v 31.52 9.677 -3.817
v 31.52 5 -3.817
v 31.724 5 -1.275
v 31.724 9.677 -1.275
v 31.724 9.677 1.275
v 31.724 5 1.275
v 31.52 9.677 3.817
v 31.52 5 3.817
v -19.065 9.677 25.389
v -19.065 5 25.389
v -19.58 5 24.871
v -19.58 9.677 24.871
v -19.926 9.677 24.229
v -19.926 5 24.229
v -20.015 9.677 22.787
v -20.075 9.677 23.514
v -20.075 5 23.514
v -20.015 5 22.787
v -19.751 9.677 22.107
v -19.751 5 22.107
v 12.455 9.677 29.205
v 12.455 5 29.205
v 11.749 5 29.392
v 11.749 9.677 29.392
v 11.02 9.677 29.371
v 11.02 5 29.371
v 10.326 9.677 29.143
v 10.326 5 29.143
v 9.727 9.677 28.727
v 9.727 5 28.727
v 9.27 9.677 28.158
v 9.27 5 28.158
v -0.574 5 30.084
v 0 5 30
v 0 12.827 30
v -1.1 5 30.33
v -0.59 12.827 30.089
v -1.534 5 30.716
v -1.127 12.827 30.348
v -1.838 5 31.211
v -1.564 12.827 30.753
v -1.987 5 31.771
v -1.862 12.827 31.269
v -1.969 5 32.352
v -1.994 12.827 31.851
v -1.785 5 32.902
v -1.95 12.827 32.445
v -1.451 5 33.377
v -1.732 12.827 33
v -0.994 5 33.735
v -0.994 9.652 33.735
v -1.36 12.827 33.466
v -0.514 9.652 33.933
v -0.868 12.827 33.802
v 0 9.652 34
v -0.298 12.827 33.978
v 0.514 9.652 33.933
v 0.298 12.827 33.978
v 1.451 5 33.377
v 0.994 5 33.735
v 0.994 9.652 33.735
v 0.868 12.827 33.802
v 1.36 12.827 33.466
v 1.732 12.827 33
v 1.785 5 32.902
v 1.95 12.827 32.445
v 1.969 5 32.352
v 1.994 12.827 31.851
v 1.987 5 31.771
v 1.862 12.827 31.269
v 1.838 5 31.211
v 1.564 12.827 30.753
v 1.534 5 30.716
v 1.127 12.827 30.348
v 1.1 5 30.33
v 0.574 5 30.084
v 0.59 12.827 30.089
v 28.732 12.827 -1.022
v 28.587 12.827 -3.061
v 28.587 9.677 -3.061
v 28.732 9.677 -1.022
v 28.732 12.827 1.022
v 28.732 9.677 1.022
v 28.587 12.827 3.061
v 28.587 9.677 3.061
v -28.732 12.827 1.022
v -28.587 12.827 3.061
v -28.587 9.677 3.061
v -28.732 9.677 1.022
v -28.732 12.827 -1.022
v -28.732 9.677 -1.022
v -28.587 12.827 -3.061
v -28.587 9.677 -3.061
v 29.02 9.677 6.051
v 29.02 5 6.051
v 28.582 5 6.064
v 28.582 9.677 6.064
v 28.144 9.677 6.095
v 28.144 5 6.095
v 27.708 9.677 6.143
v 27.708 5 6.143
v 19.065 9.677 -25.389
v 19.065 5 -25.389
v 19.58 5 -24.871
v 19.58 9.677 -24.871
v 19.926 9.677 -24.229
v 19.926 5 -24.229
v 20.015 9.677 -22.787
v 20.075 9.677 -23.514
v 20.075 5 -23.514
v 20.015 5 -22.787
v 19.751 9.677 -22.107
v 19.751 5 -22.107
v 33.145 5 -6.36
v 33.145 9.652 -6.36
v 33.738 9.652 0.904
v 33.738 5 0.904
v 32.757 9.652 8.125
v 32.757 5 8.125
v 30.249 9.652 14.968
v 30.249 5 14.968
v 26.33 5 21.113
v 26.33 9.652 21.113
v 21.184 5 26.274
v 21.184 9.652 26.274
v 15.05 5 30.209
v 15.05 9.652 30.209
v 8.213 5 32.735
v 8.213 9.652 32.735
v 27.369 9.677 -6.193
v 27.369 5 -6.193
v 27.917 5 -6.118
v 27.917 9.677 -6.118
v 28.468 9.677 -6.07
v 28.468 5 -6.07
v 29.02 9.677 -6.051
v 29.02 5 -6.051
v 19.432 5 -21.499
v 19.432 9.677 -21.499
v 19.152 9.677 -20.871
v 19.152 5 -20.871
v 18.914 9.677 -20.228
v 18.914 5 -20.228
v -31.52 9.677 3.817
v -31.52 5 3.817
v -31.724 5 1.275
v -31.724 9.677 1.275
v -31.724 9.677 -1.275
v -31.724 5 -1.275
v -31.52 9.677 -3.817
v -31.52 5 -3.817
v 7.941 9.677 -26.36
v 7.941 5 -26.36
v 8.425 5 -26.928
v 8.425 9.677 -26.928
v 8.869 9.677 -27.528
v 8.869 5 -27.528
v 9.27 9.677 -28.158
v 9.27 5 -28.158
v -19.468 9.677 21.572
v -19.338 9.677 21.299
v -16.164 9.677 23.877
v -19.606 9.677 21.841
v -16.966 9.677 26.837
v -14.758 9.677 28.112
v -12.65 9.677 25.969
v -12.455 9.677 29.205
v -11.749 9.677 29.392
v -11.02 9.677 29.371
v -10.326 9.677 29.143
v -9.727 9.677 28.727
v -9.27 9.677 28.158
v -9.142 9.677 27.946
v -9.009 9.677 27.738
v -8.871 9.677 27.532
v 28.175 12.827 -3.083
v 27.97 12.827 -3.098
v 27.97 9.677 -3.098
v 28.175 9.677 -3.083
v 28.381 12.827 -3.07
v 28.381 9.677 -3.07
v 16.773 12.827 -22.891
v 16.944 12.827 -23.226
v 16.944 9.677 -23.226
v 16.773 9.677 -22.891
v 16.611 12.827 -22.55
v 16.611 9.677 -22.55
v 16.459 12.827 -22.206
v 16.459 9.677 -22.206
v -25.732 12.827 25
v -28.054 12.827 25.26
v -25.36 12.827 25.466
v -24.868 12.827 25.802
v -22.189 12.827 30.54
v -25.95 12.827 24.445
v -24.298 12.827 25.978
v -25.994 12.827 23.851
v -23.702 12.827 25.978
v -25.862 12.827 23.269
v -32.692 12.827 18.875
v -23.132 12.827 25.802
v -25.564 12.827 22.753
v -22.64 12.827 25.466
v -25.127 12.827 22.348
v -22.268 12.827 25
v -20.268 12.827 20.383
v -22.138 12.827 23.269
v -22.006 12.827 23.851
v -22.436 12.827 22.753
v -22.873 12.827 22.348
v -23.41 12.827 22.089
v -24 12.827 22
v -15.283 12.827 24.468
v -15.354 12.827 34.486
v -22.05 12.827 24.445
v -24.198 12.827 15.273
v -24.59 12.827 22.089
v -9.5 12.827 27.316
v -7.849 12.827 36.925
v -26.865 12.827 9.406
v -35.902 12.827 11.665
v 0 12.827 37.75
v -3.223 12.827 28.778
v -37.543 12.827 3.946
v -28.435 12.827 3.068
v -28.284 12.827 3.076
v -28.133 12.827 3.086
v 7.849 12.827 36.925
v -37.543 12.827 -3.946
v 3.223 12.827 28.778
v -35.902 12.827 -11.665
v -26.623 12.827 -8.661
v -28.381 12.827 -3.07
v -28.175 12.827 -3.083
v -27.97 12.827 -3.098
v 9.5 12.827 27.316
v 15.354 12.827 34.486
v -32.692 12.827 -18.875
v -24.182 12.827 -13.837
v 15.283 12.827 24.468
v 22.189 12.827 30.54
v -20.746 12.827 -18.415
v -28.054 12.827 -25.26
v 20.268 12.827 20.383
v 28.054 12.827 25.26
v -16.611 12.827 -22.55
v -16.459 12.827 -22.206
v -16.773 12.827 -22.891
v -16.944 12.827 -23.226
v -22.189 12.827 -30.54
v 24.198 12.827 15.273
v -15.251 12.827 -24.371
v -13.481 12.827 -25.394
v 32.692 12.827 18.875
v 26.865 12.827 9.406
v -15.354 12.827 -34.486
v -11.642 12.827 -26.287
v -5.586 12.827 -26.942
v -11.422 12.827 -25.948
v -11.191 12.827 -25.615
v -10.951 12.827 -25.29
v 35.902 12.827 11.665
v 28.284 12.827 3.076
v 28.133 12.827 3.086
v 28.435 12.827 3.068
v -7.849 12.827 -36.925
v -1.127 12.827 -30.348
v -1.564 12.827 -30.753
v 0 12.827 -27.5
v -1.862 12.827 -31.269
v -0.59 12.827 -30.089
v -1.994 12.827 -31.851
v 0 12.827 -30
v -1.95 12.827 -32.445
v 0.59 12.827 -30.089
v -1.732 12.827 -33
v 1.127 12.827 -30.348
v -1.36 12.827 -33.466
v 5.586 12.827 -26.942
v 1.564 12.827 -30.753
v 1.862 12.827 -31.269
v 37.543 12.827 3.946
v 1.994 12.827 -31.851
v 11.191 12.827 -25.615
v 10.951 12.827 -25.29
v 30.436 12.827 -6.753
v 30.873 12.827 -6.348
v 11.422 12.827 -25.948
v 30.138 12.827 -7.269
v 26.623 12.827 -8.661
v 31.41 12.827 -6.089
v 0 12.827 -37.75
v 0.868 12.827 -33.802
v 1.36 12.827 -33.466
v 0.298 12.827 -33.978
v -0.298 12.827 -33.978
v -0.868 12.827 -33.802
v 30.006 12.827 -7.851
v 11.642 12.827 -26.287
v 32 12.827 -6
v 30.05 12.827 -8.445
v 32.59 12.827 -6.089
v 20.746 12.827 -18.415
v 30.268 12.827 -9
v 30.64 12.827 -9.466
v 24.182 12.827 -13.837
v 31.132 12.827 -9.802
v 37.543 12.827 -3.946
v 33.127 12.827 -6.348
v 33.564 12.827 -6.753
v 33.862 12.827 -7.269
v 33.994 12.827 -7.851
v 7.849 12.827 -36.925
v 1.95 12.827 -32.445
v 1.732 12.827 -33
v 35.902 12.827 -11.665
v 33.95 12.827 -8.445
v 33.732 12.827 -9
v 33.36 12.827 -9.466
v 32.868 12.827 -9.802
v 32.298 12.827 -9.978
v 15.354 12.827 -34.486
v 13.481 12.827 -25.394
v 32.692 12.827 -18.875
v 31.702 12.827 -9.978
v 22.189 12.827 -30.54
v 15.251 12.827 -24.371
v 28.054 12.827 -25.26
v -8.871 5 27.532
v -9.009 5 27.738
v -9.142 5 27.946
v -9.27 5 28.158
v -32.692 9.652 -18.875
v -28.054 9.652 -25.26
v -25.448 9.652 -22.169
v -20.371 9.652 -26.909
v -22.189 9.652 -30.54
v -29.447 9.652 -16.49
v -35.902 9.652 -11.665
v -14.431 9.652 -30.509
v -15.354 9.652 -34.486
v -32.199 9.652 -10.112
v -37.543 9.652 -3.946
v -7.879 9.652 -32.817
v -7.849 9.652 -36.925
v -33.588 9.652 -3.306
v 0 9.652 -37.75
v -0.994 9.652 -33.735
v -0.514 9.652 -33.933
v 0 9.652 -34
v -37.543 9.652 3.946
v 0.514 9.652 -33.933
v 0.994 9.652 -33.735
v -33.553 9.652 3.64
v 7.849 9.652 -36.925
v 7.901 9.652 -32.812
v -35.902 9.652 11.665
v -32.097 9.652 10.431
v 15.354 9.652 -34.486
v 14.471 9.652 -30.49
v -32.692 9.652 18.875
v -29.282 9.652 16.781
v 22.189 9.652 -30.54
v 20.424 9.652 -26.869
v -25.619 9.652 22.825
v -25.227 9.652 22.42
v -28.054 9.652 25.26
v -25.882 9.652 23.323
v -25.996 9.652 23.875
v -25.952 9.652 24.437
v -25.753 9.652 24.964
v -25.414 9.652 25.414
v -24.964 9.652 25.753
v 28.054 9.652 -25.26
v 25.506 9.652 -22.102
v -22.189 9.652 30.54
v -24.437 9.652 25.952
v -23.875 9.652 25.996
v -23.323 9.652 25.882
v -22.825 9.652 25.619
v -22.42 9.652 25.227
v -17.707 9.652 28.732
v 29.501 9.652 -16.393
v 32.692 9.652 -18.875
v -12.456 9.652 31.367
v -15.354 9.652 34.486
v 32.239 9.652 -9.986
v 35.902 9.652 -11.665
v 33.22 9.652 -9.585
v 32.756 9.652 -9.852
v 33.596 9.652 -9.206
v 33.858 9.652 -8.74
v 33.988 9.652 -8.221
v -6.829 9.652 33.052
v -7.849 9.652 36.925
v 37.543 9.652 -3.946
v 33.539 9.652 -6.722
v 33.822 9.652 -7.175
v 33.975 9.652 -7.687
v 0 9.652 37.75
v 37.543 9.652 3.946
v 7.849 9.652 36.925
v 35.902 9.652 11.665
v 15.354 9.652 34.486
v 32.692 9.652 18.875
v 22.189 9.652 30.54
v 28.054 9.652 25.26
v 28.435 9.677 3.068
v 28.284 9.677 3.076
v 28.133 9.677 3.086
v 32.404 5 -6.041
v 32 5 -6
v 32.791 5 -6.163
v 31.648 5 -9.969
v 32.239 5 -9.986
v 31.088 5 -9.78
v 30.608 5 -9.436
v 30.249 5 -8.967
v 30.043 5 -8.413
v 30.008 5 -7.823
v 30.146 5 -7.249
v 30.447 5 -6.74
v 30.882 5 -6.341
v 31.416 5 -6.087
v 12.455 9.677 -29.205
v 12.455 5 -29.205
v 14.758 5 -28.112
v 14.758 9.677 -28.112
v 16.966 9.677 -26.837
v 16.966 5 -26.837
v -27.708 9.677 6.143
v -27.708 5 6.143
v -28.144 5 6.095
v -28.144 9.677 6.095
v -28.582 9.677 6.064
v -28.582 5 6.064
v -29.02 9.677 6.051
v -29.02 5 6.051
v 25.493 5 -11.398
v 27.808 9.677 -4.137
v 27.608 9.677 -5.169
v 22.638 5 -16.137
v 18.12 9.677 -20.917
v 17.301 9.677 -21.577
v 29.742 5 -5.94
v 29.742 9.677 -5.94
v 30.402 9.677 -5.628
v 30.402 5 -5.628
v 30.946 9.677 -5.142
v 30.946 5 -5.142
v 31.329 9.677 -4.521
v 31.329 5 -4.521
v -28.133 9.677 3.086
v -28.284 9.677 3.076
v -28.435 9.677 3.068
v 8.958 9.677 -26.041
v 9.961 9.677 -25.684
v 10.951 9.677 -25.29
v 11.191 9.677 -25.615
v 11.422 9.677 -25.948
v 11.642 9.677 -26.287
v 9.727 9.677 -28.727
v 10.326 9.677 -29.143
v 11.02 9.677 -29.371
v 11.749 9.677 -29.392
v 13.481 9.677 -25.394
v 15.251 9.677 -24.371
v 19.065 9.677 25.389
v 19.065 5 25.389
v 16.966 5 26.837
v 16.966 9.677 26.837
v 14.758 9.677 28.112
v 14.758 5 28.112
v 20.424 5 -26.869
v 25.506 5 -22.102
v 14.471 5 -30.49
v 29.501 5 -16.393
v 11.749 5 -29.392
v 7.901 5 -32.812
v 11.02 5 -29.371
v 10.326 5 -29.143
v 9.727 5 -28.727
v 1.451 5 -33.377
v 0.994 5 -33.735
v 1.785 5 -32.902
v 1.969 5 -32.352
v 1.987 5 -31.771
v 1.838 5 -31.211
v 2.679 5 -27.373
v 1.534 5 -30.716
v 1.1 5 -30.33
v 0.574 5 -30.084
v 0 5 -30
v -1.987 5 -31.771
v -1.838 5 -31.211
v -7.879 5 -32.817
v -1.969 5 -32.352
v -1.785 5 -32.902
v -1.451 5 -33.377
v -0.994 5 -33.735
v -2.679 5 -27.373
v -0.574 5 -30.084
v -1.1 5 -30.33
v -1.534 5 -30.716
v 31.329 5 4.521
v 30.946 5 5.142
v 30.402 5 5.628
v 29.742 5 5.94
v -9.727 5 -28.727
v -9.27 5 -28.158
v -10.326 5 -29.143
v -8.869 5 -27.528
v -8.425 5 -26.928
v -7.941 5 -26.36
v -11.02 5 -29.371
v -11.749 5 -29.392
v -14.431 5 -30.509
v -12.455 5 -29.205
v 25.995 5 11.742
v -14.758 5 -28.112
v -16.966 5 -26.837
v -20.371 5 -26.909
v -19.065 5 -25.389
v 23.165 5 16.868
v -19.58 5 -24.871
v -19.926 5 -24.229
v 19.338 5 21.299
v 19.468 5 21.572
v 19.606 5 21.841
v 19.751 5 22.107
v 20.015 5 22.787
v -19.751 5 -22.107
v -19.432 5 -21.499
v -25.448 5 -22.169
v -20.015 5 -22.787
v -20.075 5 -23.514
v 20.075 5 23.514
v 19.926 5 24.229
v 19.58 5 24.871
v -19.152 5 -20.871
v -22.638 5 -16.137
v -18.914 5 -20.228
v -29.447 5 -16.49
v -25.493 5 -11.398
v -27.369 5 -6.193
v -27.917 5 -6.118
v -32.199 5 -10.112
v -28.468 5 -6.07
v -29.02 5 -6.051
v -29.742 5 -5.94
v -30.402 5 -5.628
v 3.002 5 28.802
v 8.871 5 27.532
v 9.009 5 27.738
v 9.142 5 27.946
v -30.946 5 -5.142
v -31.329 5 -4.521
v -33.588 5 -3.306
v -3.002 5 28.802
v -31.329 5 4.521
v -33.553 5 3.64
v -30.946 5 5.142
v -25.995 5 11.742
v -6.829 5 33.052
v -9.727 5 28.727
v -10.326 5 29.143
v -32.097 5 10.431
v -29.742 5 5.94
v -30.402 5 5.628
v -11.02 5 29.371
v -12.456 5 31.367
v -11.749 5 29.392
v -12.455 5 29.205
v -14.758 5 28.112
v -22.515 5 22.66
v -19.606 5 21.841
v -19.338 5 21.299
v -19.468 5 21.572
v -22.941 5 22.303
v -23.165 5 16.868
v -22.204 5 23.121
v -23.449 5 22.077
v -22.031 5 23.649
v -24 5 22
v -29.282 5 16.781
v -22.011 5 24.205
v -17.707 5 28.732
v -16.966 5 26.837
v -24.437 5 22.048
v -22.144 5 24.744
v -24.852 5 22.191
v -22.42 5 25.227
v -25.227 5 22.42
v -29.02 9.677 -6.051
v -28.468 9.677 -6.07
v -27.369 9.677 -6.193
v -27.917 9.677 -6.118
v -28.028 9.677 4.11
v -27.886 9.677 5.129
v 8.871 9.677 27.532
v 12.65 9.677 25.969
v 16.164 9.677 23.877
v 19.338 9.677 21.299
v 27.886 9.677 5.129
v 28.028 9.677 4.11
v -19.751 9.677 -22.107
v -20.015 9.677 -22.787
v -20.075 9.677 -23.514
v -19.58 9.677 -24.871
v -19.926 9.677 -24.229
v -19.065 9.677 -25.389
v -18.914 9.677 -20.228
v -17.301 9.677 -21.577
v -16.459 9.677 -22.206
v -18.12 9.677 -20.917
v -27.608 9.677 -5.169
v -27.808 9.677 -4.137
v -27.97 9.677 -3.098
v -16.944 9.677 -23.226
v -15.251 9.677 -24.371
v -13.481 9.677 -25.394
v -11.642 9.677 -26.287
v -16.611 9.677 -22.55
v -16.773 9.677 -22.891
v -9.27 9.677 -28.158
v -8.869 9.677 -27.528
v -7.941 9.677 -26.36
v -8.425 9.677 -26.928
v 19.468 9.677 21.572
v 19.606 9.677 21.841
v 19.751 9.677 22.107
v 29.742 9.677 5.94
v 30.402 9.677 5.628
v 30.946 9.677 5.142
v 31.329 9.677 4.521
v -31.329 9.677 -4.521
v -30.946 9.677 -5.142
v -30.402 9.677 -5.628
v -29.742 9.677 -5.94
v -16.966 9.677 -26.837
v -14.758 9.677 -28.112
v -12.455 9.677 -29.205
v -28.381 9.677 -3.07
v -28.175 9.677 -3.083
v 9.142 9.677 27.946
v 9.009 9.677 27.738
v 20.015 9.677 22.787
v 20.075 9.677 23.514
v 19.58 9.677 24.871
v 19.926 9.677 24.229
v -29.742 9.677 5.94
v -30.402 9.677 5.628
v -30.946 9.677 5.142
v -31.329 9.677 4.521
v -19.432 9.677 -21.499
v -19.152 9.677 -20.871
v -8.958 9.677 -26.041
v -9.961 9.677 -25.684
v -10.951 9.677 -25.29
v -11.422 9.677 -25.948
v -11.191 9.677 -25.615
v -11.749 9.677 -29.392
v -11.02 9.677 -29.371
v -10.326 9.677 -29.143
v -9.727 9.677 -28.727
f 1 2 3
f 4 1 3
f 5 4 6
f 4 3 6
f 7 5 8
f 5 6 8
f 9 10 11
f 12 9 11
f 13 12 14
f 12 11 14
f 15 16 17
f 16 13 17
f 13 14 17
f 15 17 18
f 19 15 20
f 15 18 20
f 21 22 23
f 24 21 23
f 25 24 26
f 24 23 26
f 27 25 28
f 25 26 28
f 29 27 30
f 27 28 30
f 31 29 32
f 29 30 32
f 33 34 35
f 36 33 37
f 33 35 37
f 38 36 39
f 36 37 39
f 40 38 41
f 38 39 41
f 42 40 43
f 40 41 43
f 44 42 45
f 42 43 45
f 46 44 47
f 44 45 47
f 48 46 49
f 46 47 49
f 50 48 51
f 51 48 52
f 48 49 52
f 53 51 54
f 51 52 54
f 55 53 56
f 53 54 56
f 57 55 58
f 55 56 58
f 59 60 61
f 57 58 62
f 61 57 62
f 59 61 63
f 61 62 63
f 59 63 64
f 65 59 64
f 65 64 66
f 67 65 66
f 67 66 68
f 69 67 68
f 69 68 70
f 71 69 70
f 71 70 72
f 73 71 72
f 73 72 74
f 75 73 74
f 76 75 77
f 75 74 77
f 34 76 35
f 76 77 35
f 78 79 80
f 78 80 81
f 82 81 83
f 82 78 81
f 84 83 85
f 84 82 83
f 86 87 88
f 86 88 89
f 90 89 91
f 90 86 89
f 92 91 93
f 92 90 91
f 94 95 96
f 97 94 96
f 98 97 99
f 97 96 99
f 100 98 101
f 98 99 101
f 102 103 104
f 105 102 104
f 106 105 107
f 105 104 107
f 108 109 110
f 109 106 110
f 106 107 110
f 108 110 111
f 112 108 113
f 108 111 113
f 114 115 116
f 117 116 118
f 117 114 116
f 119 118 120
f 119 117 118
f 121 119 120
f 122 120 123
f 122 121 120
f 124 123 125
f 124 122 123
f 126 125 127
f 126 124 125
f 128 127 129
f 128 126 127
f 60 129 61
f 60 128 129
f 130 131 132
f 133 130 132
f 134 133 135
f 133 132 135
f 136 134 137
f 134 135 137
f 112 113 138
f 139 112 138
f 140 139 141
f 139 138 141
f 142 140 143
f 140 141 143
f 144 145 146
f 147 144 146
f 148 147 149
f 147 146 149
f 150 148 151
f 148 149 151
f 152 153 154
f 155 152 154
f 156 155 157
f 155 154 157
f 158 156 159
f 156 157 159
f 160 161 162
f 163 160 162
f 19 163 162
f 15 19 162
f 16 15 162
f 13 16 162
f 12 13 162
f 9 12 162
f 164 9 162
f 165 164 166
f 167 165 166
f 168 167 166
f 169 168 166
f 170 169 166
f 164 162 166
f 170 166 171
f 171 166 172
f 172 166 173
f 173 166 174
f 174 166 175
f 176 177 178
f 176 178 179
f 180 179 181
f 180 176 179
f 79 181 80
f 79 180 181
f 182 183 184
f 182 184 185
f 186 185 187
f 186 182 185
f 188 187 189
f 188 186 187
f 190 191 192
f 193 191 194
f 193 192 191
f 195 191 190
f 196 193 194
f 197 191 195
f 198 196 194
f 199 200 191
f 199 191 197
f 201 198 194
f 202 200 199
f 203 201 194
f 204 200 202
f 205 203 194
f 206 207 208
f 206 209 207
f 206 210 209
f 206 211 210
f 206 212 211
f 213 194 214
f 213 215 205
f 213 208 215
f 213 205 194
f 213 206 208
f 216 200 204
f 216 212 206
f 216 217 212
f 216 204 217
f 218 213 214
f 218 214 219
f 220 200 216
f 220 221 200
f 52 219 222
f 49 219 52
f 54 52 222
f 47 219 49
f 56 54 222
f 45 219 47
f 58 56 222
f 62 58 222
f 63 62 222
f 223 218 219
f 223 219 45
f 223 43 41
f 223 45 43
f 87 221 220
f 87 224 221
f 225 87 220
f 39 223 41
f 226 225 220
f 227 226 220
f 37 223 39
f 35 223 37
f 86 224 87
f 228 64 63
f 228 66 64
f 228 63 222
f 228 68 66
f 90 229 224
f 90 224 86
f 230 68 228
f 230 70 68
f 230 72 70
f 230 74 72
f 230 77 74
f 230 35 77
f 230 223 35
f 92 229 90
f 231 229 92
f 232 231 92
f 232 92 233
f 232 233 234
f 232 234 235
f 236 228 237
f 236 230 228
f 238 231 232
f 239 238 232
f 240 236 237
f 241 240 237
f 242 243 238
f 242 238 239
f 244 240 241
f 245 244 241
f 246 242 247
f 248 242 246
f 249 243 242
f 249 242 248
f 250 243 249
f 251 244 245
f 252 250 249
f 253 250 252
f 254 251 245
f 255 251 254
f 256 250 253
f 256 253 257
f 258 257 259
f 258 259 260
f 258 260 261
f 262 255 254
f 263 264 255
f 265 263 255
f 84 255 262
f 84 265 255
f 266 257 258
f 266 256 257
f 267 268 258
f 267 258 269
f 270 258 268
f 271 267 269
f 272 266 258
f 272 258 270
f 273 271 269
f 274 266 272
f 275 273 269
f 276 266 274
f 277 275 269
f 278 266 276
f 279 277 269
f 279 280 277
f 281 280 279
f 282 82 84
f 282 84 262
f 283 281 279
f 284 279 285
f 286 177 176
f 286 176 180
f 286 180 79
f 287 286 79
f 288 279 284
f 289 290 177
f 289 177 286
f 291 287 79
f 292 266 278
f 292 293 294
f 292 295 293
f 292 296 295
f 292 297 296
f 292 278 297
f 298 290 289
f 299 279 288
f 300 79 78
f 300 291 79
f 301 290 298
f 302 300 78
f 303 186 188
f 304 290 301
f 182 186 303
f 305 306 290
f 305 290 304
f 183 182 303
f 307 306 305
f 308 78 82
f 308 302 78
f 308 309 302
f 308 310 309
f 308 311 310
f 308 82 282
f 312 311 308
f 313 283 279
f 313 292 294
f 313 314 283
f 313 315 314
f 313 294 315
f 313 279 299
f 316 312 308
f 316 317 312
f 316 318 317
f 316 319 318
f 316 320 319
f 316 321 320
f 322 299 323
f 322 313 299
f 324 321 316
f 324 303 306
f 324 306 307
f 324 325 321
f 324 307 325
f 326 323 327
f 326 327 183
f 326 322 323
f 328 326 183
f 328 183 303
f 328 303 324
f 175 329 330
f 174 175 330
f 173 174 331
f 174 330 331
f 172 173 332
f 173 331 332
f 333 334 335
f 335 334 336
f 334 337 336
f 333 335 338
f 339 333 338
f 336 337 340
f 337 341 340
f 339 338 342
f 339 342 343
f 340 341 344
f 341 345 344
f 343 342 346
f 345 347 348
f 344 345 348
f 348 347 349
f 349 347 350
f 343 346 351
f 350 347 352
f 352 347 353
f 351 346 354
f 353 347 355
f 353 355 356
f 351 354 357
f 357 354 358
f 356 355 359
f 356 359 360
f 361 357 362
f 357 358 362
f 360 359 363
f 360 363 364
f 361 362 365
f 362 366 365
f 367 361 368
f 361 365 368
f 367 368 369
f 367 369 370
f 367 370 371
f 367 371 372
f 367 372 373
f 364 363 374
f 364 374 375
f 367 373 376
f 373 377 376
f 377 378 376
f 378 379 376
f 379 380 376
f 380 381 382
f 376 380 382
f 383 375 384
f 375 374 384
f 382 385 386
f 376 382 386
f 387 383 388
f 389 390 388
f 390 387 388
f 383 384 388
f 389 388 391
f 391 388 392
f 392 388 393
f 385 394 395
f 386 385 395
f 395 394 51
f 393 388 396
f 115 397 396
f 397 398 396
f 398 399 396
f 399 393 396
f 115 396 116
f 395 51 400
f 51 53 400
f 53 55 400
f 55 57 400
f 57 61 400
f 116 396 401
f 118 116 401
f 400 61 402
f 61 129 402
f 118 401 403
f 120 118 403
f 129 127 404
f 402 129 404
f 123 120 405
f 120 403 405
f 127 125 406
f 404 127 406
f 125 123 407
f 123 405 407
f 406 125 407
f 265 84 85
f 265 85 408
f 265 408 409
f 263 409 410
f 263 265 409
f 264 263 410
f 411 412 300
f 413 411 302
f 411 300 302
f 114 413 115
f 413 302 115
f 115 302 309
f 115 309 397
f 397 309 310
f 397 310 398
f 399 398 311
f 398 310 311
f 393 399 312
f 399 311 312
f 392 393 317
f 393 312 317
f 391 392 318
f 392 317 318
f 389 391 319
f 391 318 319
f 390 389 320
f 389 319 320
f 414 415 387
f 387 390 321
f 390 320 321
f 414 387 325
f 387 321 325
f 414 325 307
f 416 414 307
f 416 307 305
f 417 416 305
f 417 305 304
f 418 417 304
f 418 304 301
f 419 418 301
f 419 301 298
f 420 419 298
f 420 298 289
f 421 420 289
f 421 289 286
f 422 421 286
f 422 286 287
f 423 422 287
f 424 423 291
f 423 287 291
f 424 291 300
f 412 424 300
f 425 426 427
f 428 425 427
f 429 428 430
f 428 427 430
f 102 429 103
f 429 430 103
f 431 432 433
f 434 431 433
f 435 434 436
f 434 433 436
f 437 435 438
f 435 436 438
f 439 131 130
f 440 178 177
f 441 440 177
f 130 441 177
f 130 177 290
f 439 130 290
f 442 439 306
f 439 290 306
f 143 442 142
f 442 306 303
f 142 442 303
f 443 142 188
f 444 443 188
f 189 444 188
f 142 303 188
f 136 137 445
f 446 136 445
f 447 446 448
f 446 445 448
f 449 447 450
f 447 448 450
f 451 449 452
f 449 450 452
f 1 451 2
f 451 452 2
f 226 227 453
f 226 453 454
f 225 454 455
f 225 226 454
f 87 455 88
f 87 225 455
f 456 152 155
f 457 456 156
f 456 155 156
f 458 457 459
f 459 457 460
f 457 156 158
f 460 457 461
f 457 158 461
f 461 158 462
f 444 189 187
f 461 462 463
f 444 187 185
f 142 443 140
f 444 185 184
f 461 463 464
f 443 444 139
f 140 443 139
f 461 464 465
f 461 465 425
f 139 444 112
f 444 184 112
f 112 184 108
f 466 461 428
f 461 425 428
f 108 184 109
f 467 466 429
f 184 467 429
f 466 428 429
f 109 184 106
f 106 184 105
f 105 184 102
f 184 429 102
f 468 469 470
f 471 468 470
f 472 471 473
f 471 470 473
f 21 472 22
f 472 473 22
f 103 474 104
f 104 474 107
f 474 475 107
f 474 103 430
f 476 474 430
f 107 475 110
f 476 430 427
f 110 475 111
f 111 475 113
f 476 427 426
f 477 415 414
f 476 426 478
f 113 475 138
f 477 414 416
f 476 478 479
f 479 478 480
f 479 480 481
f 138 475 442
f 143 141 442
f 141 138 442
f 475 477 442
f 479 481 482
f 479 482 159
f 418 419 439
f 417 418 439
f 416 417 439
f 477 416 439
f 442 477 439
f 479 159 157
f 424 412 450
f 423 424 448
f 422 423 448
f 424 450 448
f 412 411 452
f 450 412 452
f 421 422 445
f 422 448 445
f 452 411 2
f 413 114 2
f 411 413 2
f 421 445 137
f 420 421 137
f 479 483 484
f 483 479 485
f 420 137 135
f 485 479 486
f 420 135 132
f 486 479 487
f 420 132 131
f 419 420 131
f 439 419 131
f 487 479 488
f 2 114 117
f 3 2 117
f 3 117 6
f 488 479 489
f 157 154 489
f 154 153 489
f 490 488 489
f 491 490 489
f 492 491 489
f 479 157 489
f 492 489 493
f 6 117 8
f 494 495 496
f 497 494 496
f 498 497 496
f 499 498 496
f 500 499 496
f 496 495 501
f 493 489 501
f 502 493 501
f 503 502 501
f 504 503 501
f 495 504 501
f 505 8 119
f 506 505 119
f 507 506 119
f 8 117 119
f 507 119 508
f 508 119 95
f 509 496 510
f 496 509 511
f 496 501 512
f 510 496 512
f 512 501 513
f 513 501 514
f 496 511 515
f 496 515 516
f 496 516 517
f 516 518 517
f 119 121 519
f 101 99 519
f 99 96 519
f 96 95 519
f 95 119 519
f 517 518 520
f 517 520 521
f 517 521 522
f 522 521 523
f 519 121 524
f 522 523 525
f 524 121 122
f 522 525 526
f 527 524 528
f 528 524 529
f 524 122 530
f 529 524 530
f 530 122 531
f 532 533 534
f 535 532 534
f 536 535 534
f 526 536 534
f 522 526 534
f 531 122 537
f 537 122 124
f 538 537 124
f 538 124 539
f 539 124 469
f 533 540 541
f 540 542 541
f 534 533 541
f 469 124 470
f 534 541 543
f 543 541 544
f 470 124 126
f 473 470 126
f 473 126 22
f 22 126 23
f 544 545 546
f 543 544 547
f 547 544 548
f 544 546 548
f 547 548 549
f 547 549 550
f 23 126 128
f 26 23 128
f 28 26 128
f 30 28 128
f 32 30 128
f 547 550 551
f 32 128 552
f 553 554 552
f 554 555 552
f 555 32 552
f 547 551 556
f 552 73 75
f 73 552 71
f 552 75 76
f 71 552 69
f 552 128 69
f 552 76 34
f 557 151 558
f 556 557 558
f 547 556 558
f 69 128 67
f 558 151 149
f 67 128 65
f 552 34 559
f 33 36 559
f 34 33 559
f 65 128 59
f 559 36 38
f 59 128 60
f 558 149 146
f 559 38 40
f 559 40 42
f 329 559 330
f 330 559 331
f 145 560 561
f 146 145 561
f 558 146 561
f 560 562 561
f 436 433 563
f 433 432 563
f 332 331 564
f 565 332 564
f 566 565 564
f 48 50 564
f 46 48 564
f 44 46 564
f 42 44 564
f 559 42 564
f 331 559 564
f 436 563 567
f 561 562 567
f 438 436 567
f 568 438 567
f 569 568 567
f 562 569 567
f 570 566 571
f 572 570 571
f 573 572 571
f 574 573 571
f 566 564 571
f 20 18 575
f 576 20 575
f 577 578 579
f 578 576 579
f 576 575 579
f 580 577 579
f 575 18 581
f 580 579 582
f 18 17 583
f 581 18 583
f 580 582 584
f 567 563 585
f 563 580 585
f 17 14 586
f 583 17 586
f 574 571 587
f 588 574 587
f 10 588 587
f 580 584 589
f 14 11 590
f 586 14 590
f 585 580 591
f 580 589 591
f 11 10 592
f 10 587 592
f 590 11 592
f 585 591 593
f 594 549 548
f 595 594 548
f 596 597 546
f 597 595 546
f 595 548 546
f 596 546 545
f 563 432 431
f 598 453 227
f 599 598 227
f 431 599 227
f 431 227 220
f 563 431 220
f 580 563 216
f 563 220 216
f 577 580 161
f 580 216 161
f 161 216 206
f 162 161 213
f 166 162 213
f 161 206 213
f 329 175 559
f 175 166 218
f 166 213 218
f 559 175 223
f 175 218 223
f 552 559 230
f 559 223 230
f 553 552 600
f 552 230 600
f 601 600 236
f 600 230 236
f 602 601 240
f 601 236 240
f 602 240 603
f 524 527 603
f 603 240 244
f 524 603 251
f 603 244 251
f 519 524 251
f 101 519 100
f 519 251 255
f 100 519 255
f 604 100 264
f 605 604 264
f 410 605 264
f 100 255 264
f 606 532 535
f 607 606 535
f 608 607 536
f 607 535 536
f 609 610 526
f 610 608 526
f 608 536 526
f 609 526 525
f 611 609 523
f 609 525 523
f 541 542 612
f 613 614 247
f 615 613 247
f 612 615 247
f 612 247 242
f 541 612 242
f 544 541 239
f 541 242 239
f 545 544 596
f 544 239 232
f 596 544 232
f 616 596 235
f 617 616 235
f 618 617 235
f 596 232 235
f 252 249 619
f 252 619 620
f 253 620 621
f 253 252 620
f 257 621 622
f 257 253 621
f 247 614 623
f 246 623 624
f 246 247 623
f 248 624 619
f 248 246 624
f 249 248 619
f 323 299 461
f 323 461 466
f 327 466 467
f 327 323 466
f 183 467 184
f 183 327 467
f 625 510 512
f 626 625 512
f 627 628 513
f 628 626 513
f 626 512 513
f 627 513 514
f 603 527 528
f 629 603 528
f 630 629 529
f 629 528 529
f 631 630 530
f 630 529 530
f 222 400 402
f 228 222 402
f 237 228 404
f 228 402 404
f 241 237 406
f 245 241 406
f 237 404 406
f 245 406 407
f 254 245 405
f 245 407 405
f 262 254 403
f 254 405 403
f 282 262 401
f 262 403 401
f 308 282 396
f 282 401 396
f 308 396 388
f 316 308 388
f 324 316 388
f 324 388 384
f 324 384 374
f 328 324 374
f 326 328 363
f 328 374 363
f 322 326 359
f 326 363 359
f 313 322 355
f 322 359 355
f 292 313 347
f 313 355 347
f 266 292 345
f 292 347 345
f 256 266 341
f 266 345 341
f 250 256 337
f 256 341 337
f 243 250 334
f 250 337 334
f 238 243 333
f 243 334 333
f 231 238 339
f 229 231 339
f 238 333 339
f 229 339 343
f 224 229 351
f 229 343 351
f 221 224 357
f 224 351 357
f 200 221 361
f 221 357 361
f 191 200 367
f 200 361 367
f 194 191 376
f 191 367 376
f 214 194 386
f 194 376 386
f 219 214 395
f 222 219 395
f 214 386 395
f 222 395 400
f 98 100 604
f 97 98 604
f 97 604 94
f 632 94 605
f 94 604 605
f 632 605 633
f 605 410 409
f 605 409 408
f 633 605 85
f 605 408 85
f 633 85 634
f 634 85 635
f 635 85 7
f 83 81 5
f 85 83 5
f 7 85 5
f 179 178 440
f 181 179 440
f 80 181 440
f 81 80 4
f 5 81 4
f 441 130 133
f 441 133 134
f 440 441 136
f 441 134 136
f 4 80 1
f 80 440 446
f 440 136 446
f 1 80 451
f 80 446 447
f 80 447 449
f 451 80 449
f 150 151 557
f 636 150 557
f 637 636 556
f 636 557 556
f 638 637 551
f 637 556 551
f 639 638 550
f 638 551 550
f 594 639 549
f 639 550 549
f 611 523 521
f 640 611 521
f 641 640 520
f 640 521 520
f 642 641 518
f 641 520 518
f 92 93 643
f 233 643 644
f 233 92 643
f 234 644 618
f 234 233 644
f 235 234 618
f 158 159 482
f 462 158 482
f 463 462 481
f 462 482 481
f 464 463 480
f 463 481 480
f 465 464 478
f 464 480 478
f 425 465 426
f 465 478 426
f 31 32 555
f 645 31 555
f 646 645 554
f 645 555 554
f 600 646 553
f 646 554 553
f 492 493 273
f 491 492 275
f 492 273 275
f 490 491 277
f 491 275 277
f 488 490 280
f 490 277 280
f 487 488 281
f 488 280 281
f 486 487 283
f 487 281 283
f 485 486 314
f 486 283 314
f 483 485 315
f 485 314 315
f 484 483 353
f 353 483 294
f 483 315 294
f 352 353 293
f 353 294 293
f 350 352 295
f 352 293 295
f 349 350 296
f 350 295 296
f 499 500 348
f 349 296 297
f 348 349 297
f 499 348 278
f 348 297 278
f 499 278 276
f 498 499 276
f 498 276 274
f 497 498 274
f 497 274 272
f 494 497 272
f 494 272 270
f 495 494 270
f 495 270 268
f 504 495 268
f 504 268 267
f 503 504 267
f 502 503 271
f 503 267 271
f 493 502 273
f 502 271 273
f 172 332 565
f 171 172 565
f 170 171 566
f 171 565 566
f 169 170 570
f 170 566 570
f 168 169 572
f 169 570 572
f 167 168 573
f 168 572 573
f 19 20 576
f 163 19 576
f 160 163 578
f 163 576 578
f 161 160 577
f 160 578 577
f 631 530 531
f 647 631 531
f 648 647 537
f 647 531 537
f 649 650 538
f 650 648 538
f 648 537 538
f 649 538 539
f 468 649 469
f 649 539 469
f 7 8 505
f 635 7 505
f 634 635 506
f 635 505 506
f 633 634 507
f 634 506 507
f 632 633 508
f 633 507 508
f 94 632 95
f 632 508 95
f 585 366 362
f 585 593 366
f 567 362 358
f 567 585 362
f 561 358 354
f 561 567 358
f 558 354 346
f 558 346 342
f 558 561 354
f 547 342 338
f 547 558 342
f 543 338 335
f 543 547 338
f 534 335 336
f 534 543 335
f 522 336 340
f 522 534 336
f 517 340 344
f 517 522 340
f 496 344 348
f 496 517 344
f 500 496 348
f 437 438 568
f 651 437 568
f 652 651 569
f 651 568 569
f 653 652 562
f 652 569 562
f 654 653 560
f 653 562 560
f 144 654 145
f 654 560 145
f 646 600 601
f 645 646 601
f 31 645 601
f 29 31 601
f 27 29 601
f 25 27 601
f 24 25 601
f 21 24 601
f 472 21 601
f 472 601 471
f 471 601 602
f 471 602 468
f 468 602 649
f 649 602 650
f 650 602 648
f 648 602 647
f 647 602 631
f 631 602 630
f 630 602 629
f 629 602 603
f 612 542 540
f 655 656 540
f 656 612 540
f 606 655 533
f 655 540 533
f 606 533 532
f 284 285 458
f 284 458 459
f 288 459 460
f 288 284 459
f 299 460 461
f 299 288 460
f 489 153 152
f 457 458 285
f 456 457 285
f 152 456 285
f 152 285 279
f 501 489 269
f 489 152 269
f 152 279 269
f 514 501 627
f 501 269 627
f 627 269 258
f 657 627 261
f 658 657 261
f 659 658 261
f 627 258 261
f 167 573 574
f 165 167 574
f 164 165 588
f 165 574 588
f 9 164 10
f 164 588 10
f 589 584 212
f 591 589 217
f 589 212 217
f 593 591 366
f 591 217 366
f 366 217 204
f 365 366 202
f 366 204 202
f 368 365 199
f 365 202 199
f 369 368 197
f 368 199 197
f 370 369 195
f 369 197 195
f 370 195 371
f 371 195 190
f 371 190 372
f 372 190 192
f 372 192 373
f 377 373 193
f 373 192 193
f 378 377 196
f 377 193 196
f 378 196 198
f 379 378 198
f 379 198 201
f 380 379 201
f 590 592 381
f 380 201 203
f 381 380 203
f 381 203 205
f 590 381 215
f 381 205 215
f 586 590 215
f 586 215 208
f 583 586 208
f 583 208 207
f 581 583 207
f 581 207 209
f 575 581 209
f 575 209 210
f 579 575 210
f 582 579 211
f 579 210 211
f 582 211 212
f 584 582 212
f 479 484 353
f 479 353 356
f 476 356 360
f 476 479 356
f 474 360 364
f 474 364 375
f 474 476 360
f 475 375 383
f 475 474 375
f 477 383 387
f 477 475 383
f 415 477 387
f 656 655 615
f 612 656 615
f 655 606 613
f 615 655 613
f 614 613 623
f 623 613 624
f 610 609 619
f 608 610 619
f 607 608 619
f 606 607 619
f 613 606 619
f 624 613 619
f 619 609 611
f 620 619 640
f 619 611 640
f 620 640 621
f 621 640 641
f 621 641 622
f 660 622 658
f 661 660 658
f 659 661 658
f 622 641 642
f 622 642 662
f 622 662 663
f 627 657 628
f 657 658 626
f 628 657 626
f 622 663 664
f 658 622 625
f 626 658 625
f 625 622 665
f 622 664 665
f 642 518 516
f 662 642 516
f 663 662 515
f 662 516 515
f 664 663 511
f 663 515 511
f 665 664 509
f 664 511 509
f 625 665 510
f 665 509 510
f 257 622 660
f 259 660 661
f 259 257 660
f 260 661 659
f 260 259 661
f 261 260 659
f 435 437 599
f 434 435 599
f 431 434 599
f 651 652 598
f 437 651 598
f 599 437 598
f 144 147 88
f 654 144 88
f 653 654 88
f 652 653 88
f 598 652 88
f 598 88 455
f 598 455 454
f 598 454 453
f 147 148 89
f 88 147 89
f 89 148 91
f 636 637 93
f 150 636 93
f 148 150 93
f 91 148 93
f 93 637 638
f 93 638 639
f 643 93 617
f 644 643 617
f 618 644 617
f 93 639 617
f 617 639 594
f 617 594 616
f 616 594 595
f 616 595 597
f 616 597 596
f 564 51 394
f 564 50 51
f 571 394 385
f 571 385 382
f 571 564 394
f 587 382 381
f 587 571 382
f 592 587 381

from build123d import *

# Parameters (mm, degrees)
SKETCH1_R           = 6.35
BOSS_EXTRUDE1_DEPTH = 9.652
FILLET1_R           = 2.54
SKETCH2_R           = 33.75
BOSS_EXTRUDE2_DEPTH = 9.652
CUT_EXTRUDE1_DEPTH  = 49.695853067
SKETCH4_R           = 37.75
SKETCH4_R_2         = 33.75
BOSS_EXTRUDE3_DEPTH = 3.175
BOSS_EXTRUDE4_DEPTH = 3.15
CUT_EXTRUDE2_DEPTH  = 61.228214281
SKETCH6_R           = 28.231147361
CUT_EXTRUDE3_DEPTH  = 61.228214281
CUT_EXTRUDE5_DEPTH  = 5


with BuildPart() as part:
    # Sketch1 → Boss-Extrude1 (new body)
    with BuildSketch(Plane(origin=(0, 0, 0), x_dir=(1, 0, 0), z_dir=(0, 1, 0))):
        with BuildLine():
            ThreePointArc((-10.16, 30.080506977), (0, 22.86), (10.16, 30.080506977))
            ThreePointArc((10.16, 30.080506977), (15.875, 27.49630657), (20.970483201, 23.839071591))
            ThreePointArc((20.970483201, 23.839071591), (19.797340731, 11.43), (31.130483201, 6.241435386))
            ThreePointArc((31.130483201, 6.241435386), (31.75, 0), (31.130483201, -6.241435386))
            ThreePointArc((31.130483201, -6.241435386), (19.797340731, -11.43), (20.970483201, -23.839071591))
            ThreePointArc((20.970483201, -23.839071591), (15.875, -27.49630657), (10.16, -30.080506977))
            ThreePointArc((10.16, -30.080506977), (0, -22.86), (-10.16, -30.080506977))
            ThreePointArc((-10.16, -30.080506977), (-15.875, -27.49630657), (-20.970483201, -23.839071591))
            ThreePointArc((-20.970483201, -23.839071591), (-19.797340731, -11.43), (-31.130483201, -6.241435386))
            ThreePointArc((-31.130483201, -6.241435386), (-31.75, 0), (-31.130483201, 6.241435386))
            ThreePointArc((-31.130483201, 6.241435386), (-19.797340731, 11.43), (-20.970483201, 23.839071591))
            ThreePointArc((-20.970483201, 23.839071591), (-15.875, 27.49630657), (-10.16, 30.080506977))
        make_face()
        with Locations(Location((0, 0, 0), (0, 0, 270))):
            Circle(SKETCH1_R, mode=Mode.SUBTRACT)
    extrude(amount=BOSS_EXTRUDE1_DEPTH)

    # Fillet1
    fillet1_edges = [part.edges().sort_by_distance(p)[0] for p in [
        (-10.16, 4.826, -30.080506977),
        (10.16, 4.826, -30.080506977),
        (20.970483201, 4.826, -23.839071591),
        (31.130483201, 4.826, -6.241435386),
        (31.130483201, 4.826, 6.241435386),
        (20.970483201, 4.826, 23.839071591),
        (10.16, 4.826, 30.080506977),
        (-10.16, 4.826, 30.080506977),
        (-20.970483201, 4.826, 23.839071591),
        (-31.130483201, 4.826, 6.241435386),
        (-31.130483201, 4.826, -6.241435386),
        (-20.970483201, 4.826, -23.839071591),
    ]]
    fillet(fillet1_edges, radius=FILLET1_R)

    # Sketch3 → Cut-Extrude1 (cut, through all)
    with BuildSketch(Plane(origin=(0, 9.652, 0), x_dir=(1, 0, 0), z_dir=(0, 1, 0))):
        with BuildLine():
            ThreePointArc((12.454547411, -29.205252076), (15.875, -27.49630657), (19.065216516, -25.388580488))
            ThreePointArc((19.065216516, -25.388580488), (20.026339499, -23.876831986), (19.750712464, -22.106755531))
            ThreePointArc((19.750712464, -22.106755531), (19.797340731, -11.43), (29.020368117, -6.051240971))
            ThreePointArc((29.020368117, -6.051240971), (30.691112811, -5.404902757), (31.519763927, -3.816671587))
            ThreePointArc((31.519763927, -3.816671587), (31.75, 0), (31.519763927, 3.816671587))
            ThreePointArc((31.519763927, 3.816671587), (30.691112811, 5.404902757), (29.020368117, 6.051240971))
            ThreePointArc((29.020368117, 6.051240971), (19.797340731, 11.43), (19.750712464, 22.106755531))
            ThreePointArc((19.750712464, 22.106755531), (20.026339499, 23.876831986), (19.065216516, 25.388580488))
            ThreePointArc((19.065216516, 25.388580488), (15.875, 27.49630657), (12.454547411, 29.205252076))
            ThreePointArc((12.454547411, 29.205252076), (10.664773313, 29.281734744), (9.269655653, 28.157996502))
            ThreePointArc((9.269655653, 28.157996502), (0, 22.86), (-9.269655653, 28.157996502))
            ThreePointArc((-9.269655653, 28.157996502), (-10.664773313, 29.281734744), (-12.454547411, 29.205252076))
            ThreePointArc((-12.454547411, 29.205252076), (-15.875, 27.49630657), (-19.065216516, 25.388580488))
            ThreePointArc((-19.065216516, 25.388580488), (-20.026339499, 23.876831986), (-19.750712464, 22.106755531))
            ThreePointArc((-19.750712464, 22.106755531), (-19.797340731, 11.43), (-29.020368117, 6.051240971))
            ThreePointArc((-29.020368117, 6.051240971), (-30.691112811, 5.404902757), (-31.519763927, 3.816671587))
            ThreePointArc((-31.519763927, 3.816671587), (-31.75, 0), (-31.519763927, -3.816671587))
            ThreePointArc((-31.519763927, -3.816671587), (-30.691112811, -5.404902757), (-29.020368117, -6.051240971))
            ThreePointArc((-29.020368117, -6.051240971), (-19.797340731, -11.43), (-19.750712464, -22.106755531))
            ThreePointArc((-19.750712464, -22.106755531), (-20.026339499, -23.876831986), (-19.065216516, -25.388580488))
            ThreePointArc((-19.065216516, -25.388580488), (-15.875, -27.49630657), (-12.454547411, -29.205252076))
            ThreePointArc((-12.454547411, -29.205252076), (-10.664773313, -29.281734744), (-9.269655653, -28.157996502))
            ThreePointArc((-9.269655653, -28.157996502), (0, -22.86), (9.269655653, -28.157996502))
            ThreePointArc((9.269655653, -28.157996502), (10.664773313, -29.281734744), (12.454547411, -29.205252076))
        make_face()
    extrude(amount=-CUT_EXTRUDE1_DEPTH, mode=Mode.SUBTRACT)


with BuildPart() as body_2:
    # Sketch2 → Boss-Extrude2 (new, through all)
    with BuildSketch(Plane.XZ):
        with Locations(Location((0, 0, 0), (0, 0, 270))):
            Circle(SKETCH2_R)
        with BuildLine():
            ThreePointArc((19.750712464, 22.106755531), (19.797340731, 11.43), (29.020368117, 6.051240971))
            ThreePointArc((29.020368117, 6.051240971), (30.691112811, 5.404902757), (31.519763927, 3.816671587))
            ThreePointArc((31.519763927, 3.816671587), (31.75, 0), (31.519763927, -3.816671587))
            ThreePointArc((31.519763927, -3.816671587), (30.691112811, -5.404902757), (29.020368117, -6.051240971))
            ThreePointArc((29.020368117, -6.051240971), (19.797340731, -11.43), (19.750712464, -22.106755531))
            ThreePointArc((19.750712464, -22.106755531), (20.026339499, -23.876831986), (19.065216516, -25.388580488))
            ThreePointArc((19.065216516, -25.388580488), (15.875, -27.49630657), (12.454547411, -29.205252076))
            ThreePointArc((12.454547411, -29.205252076), (10.664773313, -29.281734744), (9.269655653, -28.157996502))
            ThreePointArc((9.269655653, -28.157996502), (0, -22.86), (-9.269655653, -28.157996502))
            ThreePointArc((-9.269655653, -28.157996502), (-10.664773313, -29.281734744), (-12.454547411, -29.205252076))
            ThreePointArc((-12.454547411, -29.205252076), (-15.875, -27.49630657), (-19.065216516, -25.388580488))
            ThreePointArc((-19.065216516, -25.388580488), (-20.026339499, -23.876831986), (-19.750712464, -22.106755531))
            ThreePointArc((-19.750712464, -22.106755531), (-19.797340731, -11.43), (-29.020368117, -6.051240971))
            ThreePointArc((-29.020368117, -6.051240971), (-30.691112811, -5.404902757), (-31.519763927, -3.816671587))
            ThreePointArc((-31.519763927, -3.816671587), (-31.75, 0), (-31.519763927, 3.816671587))
            ThreePointArc((-31.519763927, 3.816671587), (-30.691112811, 5.404902757), (-29.020368117, 6.051240971))
            ThreePointArc((-29.020368117, 6.051240971), (-19.797340731, 11.43), (-19.750712464, 22.106755531))
            ThreePointArc((-19.750712464, 22.106755531), (-20.026339499, 23.876831986), (-19.065216516, 25.388580488))
            ThreePointArc((-19.065216516, 25.388580488), (-15.875, 27.49630657), (-12.454547411, 29.205252076))
            ThreePointArc((-12.454547411, 29.205252076), (-10.664773313, 29.281734744), (-9.269655653, 28.157996502))
            ThreePointArc((-9.269655653, 28.157996502), (0, 22.86), (9.269655653, 28.157996502))
            ThreePointArc((9.269655653, 28.157996502), (10.664773313, 29.281734744), (12.454547411, 29.205252076))
            ThreePointArc((12.454547411, 29.205252076), (15.875, 27.49630657), (19.065216516, 25.388580488))
            ThreePointArc((19.065216516, 25.388580488), (20.026339499, 23.876831986), (19.750712464, 22.106755531))
        make_face(mode=Mode.SUBTRACT)
    extrude(amount=-BOSS_EXTRUDE2_DEPTH)

    # Sketch4 → Boss-Extrude3 (add)
    # profile 1 of 2: a face of its own
    with BuildSketch(Plane(origin=(0, 9.652, 0), x_dir=(1, 0, 0), z_dir=(0, 1, 0))):
        with Locations(Location((0, 0, 0), (0, 0, 270))):
            Circle(SKETCH4_R)
        with Locations(Location((0, 0, 0), (0, 0, 90))):
            Circle(SKETCH4_R_2, mode=Mode.SUBTRACT)
    # profile 2 of 2: a face of its own
    with BuildSketch(Plane(origin=(0, 9.652, 0), x_dir=(1, 0, 0), z_dir=(0, 1, 0))):
        with Locations(Location((0, 0, 0), (0, 0, 90))):
            Circle(SKETCH4_R_2)
        with BuildLine():
            ThreePointArc((31.519763927, -3.816671587), (30.691112811, -5.404902757), (29.020368117, -6.051240971))
            ThreePointArc((29.020368117, -6.051240971), (19.797340731, -11.43), (19.750712464, -22.106755531))
            ThreePointArc((19.750712464, -22.106755531), (20.026339499, -23.876831986), (19.065216516, -25.388580488))
            ThreePointArc((19.065216516, -25.388580488), (15.875, -27.49630657), (12.454547411, -29.205252076))
            ThreePointArc((12.454547411, -29.205252076), (10.664773313, -29.281734744), (9.269655653, -28.157996502))
            ThreePointArc((9.269655653, -28.157996502), (0, -22.86), (-9.269655653, -28.157996502))
            ThreePointArc((-9.269655653, -28.157996502), (-10.664773313, -29.281734744), (-12.454547411, -29.205252076))
            ThreePointArc((-12.454547411, -29.205252076), (-15.875, -27.49630657), (-19.065216516, -25.388580488))
            ThreePointArc((-19.065216516, -25.388580488), (-20.026339499, -23.876831986), (-19.750712464, -22.106755531))
            ThreePointArc((-19.750712464, -22.106755531), (-19.797340731, -11.43), (-29.020368117, -6.051240971))
            ThreePointArc((-29.020368117, -6.051240971), (-30.691112811, -5.404902757), (-31.519763927, -3.816671587))
            ThreePointArc((-31.519763927, -3.816671587), (-31.75, 0), (-31.519763927, 3.816671587))
            ThreePointArc((-31.519763927, 3.816671587), (-30.691112811, 5.404902757), (-29.020368117, 6.051240971))
            ThreePointArc((-29.020368117, 6.051240971), (-19.797340731, 11.43), (-19.750712464, 22.106755531))
            ThreePointArc((-19.750712464, 22.106755531), (-20.026339499, 23.876831986), (-19.065216516, 25.388580488))
            ThreePointArc((-19.065216516, 25.388580488), (-15.875, 27.49630657), (-12.454547411, 29.205252076))
            ThreePointArc((-12.454547411, 29.205252076), (-10.664773313, 29.281734744), (-9.269655653, 28.157996502))
            ThreePointArc((-9.269655653, 28.157996502), (0, 22.86), (9.269655653, 28.157996502))
            ThreePointArc((9.269655653, 28.157996502), (10.664773313, 29.281734744), (12.454547411, 29.205252076))
            ThreePointArc((12.454547411, 29.205252076), (15.875, 27.49630657), (19.065216516, 25.388580488))
            ThreePointArc((19.065216516, 25.388580488), (20.026339499, 23.876831986), (19.750712464, 22.106755531))
            ThreePointArc((19.750712464, 22.106755531), (19.797340731, 11.43), (29.020368117, 6.051240971))
            ThreePointArc((29.020368117, 6.051240971), (30.691112811, 5.404902757), (31.519763927, 3.816671587))
            ThreePointArc((31.519763927, 3.816671587), (31.75, 0), (31.519763927, -3.816671587))
        make_face(mode=Mode.SUBTRACT)
    extrude(amount=BOSS_EXTRUDE3_DEPTH)

    # Sketch9 → Boss-Extrude4 (add)
    with BuildSketch(Plane(origin=(0, 12.827, 0), x_dir=(1, 0, 0), z_dir=(0, 1, 0))):
        with BuildLine():
            ThreePointArc((-19.065216516, 25.388580488), (-20.026339499, 23.876831986), (-19.750712464, 22.106755531))
            ThreePointArc((-19.750712464, 22.106755531), (-19.797340731, 11.43), (-29.020368117, 6.051240971))
            ThreePointArc((-29.020368117, 6.051240971), (-30.691112811, 5.404902757), (-31.519763927, 3.816671587))
            ThreePointArc((-31.519763927, 3.816671587), (-31.75, 0), (-31.519763927, -3.816671587))
            ThreePointArc((-31.519763927, -3.816671587), (-30.691112811, -5.404902757), (-29.020368117, -6.051240971))
            ThreePointArc((-29.020368117, -6.051240971), (-19.797340731, -11.43), (-19.750712464, -22.106755531))
            ThreePointArc((-19.750712464, -22.106755531), (-20.026339499, -23.876831986), (-19.065216516, -25.388580488))
            ThreePointArc((-19.065216516, -25.388580488), (-15.875, -27.49630657), (-12.454547411, -29.205252076))
            ThreePointArc((-12.454547411, -29.205252076), (-10.664773313, -29.281734744), (-9.269655653, -28.157996502))
            ThreePointArc((-9.269655653, -28.157996502), (0, -22.86), (9.269655653, -28.157996502))
            ThreePointArc((9.269655653, -28.157996502), (10.664773313, -29.281734744), (12.454547411, -29.205252076))
            ThreePointArc((12.454547411, -29.205252076), (15.875, -27.49630657), (19.065216516, -25.388580488))
            ThreePointArc((19.065216516, -25.388580488), (20.026339499, -23.876831986), (19.750712464, -22.106755531))
            ThreePointArc((19.750712464, -22.106755531), (19.797340731, -11.43), (29.020368117, -6.051240971))
            ThreePointArc((29.020368117, -6.051240971), (30.691112811, -5.404902757), (31.519763927, -3.816671587))
            ThreePointArc((31.519763927, -3.816671587), (31.75, 0), (31.519763927, 3.816671587))
            ThreePointArc((31.519763927, 3.816671587), (30.691112811, 5.404902757), (29.020368117, 6.051240971))
            ThreePointArc((29.020368117, 6.051240971), (19.797340731, 11.43), (19.750712464, 22.106755531))
            ThreePointArc((19.750712464, 22.106755531), (20.026339499, 23.876831986), (19.065216516, 25.388580488))
            ThreePointArc((19.065216516, 25.388580488), (15.875, 27.49630657), (12.454547411, 29.205252076))
            ThreePointArc((12.454547411, 29.205252076), (10.664773313, 29.281734744), (9.269655653, 28.157996502))
            ThreePointArc((9.269655653, 28.157996502), (0, 22.86), (-9.269655653, 28.157996502))
            ThreePointArc((-9.269655653, 28.157996502), (-10.664773313, 29.281734744), (-12.454547411, 29.205252076))
            ThreePointArc((-12.454547411, 29.205252076), (-15.875, 27.49630657), (-19.065216516, 25.388580488))
        make_face()
        with BuildLine():
            ThreePointArc((-28.586588604, 3.060956059), (-17.199264519, 9.93), (-16.944160009, 23.226233909))
            ThreePointArc((-16.944160009, 23.226233909), (-14.375, 24.898230359), (-11.642428595, 26.287189968))
            ThreePointArc((-11.642428595, 26.287189968), (0, 19.86), (11.642428595, 26.287189968))
            ThreePointArc((11.642428595, 26.287189968), (14.375, 24.898230359), (16.944160009, 23.226233909))
            ThreePointArc((16.944160009, 23.226233909), (17.199264519, 9.93), (28.586588604, 3.060956059))
            ThreePointArc((28.586588604, 3.060956059), (28.75, 0), (28.586588604, -3.060956059))
            ThreePointArc((28.586588604, -3.060956059), (17.199264519, -9.93), (16.944160009, -23.226233909))
            ThreePointArc((16.944160009, -23.226233909), (14.375, -24.898230359), (11.642428595, -26.287189968))
            ThreePointArc((11.642428595, -26.287189968), (0, -19.86), (-11.642428595, -26.287189968))
            ThreePointArc((-11.642428595, -26.287189968), (-14.375, -24.898230359), (-16.944160009, -23.226233909))
            ThreePointArc((-16.944160009, -23.226233909), (-17.199264519, -9.93), (-28.586588604, -3.060956059))
            ThreePointArc((-28.586588604, -3.060956059), (-28.75, 0), (-28.586588604, 3.060956059))
        make_face(mode=Mode.SUBTRACT)
    extrude(amount=-BOSS_EXTRUDE4_DEPTH)

    # Sketch5 → Cut-Extrude2 (cut, through all)
    with BuildSketch(Plane(origin=(-2.874930527, 12.827, -4.823711209), x_dir=(1, 0, 0), z_dir=(0, 1, 0))):
        with BuildLine():
            ThreePointArc((-21.125069473, -30.823711209), (-19.125069473, -28.823711209), (-21.125069473, -26.823711209))
            ThreePointArc((-21.125069473, -26.823711209), (-23.125069473, -28.823711209), (-21.125069473, -30.823711209))
        make_face()
        with BuildLine():
            ThreePointArc((34.874930527, 5.176288791), (32.874930527, 3.176288791), (34.874930527, 1.176288791))
            ThreePointArc((34.874930527, 1.176288791), (36.874930527, 3.176288791), (34.874930527, 5.176288791))
        make_face()
        with BuildLine():
            ThreePointArc((2.874930527, 29.176288791), (0.874930527, 27.176288791), (2.874930527, 25.176288791))
            ThreePointArc((2.874930527, 25.176288791), (4.874930527, 27.176288791), (2.874930527, 29.176288791))
        make_face()
        with BuildLine():
            ThreePointArc((2.874930527, -38.823711209), (4.874930527, -36.823711209), (2.874930527, -34.823711209))
            ThreePointArc((2.874930527, -34.823711209), (0.874930527, -36.823711209), (2.874930527, -38.823711209))
        make_face()
    extrude(amount=-CUT_EXTRUDE2_DEPTH, mode=Mode.SUBTRACT)

    # Sketch6 → Cut-Extrude3 (cut, through all)
    with BuildSketch(Plane(origin=(-2.874930527, 12.827, -4.823711209), x_dir=(1, 0, 0), z_dir=(0, 1, 0))):
        with Locations((2.874930527, -5.55485857)):
            Circle(SKETCH6_R)
    extrude(amount=-CUT_EXTRUDE3_DEPTH, mode=Mode.SUBTRACT)

    # Sketch8 → Cut-Extrude5 (cut)
    with BuildSketch(Plane.XZ):
        with BuildLine():
            ThreePointArc((-25.226732576, 22.42040284), (-22.585786438, 22.585786438), (-22.42040284, 25.226732576))
            ThreePointArc((-22.42040284, 25.226732576), (-12.456354606, 31.367207876), (-0.994261009, 33.735351562))
            ThreePointArc((-0.994261009, 33.735351562), (0, 30), (0.994261009, 33.735351563))
            ThreePointArc((0.994261009, 33.735351563), (26.330466184, 21.113243486), (33.145258747, -6.360371261))
            ThreePointArc((33.145258747, -6.360371261), (30.059715, -7.51492875), (32.238932429, -9.985676533))
            ThreePointArc((32.238932429, -9.985676533), (20.423590589, -26.868930896), (0.994261009, -33.735351562))
            ThreePointArc((0.994261009, -33.735351562), (0, -30), (-0.994261009, -33.735351562))
            ThreePointArc((-0.994261009, -33.735351562), (-30.987938207, -13.371992585), (-25.226732576, 22.42040284))
        make_face()
    extrude(amount=-CUT_EXTRUDE5_DEPTH, mode=Mode.SUBTRACT)


solid = body_2.part
